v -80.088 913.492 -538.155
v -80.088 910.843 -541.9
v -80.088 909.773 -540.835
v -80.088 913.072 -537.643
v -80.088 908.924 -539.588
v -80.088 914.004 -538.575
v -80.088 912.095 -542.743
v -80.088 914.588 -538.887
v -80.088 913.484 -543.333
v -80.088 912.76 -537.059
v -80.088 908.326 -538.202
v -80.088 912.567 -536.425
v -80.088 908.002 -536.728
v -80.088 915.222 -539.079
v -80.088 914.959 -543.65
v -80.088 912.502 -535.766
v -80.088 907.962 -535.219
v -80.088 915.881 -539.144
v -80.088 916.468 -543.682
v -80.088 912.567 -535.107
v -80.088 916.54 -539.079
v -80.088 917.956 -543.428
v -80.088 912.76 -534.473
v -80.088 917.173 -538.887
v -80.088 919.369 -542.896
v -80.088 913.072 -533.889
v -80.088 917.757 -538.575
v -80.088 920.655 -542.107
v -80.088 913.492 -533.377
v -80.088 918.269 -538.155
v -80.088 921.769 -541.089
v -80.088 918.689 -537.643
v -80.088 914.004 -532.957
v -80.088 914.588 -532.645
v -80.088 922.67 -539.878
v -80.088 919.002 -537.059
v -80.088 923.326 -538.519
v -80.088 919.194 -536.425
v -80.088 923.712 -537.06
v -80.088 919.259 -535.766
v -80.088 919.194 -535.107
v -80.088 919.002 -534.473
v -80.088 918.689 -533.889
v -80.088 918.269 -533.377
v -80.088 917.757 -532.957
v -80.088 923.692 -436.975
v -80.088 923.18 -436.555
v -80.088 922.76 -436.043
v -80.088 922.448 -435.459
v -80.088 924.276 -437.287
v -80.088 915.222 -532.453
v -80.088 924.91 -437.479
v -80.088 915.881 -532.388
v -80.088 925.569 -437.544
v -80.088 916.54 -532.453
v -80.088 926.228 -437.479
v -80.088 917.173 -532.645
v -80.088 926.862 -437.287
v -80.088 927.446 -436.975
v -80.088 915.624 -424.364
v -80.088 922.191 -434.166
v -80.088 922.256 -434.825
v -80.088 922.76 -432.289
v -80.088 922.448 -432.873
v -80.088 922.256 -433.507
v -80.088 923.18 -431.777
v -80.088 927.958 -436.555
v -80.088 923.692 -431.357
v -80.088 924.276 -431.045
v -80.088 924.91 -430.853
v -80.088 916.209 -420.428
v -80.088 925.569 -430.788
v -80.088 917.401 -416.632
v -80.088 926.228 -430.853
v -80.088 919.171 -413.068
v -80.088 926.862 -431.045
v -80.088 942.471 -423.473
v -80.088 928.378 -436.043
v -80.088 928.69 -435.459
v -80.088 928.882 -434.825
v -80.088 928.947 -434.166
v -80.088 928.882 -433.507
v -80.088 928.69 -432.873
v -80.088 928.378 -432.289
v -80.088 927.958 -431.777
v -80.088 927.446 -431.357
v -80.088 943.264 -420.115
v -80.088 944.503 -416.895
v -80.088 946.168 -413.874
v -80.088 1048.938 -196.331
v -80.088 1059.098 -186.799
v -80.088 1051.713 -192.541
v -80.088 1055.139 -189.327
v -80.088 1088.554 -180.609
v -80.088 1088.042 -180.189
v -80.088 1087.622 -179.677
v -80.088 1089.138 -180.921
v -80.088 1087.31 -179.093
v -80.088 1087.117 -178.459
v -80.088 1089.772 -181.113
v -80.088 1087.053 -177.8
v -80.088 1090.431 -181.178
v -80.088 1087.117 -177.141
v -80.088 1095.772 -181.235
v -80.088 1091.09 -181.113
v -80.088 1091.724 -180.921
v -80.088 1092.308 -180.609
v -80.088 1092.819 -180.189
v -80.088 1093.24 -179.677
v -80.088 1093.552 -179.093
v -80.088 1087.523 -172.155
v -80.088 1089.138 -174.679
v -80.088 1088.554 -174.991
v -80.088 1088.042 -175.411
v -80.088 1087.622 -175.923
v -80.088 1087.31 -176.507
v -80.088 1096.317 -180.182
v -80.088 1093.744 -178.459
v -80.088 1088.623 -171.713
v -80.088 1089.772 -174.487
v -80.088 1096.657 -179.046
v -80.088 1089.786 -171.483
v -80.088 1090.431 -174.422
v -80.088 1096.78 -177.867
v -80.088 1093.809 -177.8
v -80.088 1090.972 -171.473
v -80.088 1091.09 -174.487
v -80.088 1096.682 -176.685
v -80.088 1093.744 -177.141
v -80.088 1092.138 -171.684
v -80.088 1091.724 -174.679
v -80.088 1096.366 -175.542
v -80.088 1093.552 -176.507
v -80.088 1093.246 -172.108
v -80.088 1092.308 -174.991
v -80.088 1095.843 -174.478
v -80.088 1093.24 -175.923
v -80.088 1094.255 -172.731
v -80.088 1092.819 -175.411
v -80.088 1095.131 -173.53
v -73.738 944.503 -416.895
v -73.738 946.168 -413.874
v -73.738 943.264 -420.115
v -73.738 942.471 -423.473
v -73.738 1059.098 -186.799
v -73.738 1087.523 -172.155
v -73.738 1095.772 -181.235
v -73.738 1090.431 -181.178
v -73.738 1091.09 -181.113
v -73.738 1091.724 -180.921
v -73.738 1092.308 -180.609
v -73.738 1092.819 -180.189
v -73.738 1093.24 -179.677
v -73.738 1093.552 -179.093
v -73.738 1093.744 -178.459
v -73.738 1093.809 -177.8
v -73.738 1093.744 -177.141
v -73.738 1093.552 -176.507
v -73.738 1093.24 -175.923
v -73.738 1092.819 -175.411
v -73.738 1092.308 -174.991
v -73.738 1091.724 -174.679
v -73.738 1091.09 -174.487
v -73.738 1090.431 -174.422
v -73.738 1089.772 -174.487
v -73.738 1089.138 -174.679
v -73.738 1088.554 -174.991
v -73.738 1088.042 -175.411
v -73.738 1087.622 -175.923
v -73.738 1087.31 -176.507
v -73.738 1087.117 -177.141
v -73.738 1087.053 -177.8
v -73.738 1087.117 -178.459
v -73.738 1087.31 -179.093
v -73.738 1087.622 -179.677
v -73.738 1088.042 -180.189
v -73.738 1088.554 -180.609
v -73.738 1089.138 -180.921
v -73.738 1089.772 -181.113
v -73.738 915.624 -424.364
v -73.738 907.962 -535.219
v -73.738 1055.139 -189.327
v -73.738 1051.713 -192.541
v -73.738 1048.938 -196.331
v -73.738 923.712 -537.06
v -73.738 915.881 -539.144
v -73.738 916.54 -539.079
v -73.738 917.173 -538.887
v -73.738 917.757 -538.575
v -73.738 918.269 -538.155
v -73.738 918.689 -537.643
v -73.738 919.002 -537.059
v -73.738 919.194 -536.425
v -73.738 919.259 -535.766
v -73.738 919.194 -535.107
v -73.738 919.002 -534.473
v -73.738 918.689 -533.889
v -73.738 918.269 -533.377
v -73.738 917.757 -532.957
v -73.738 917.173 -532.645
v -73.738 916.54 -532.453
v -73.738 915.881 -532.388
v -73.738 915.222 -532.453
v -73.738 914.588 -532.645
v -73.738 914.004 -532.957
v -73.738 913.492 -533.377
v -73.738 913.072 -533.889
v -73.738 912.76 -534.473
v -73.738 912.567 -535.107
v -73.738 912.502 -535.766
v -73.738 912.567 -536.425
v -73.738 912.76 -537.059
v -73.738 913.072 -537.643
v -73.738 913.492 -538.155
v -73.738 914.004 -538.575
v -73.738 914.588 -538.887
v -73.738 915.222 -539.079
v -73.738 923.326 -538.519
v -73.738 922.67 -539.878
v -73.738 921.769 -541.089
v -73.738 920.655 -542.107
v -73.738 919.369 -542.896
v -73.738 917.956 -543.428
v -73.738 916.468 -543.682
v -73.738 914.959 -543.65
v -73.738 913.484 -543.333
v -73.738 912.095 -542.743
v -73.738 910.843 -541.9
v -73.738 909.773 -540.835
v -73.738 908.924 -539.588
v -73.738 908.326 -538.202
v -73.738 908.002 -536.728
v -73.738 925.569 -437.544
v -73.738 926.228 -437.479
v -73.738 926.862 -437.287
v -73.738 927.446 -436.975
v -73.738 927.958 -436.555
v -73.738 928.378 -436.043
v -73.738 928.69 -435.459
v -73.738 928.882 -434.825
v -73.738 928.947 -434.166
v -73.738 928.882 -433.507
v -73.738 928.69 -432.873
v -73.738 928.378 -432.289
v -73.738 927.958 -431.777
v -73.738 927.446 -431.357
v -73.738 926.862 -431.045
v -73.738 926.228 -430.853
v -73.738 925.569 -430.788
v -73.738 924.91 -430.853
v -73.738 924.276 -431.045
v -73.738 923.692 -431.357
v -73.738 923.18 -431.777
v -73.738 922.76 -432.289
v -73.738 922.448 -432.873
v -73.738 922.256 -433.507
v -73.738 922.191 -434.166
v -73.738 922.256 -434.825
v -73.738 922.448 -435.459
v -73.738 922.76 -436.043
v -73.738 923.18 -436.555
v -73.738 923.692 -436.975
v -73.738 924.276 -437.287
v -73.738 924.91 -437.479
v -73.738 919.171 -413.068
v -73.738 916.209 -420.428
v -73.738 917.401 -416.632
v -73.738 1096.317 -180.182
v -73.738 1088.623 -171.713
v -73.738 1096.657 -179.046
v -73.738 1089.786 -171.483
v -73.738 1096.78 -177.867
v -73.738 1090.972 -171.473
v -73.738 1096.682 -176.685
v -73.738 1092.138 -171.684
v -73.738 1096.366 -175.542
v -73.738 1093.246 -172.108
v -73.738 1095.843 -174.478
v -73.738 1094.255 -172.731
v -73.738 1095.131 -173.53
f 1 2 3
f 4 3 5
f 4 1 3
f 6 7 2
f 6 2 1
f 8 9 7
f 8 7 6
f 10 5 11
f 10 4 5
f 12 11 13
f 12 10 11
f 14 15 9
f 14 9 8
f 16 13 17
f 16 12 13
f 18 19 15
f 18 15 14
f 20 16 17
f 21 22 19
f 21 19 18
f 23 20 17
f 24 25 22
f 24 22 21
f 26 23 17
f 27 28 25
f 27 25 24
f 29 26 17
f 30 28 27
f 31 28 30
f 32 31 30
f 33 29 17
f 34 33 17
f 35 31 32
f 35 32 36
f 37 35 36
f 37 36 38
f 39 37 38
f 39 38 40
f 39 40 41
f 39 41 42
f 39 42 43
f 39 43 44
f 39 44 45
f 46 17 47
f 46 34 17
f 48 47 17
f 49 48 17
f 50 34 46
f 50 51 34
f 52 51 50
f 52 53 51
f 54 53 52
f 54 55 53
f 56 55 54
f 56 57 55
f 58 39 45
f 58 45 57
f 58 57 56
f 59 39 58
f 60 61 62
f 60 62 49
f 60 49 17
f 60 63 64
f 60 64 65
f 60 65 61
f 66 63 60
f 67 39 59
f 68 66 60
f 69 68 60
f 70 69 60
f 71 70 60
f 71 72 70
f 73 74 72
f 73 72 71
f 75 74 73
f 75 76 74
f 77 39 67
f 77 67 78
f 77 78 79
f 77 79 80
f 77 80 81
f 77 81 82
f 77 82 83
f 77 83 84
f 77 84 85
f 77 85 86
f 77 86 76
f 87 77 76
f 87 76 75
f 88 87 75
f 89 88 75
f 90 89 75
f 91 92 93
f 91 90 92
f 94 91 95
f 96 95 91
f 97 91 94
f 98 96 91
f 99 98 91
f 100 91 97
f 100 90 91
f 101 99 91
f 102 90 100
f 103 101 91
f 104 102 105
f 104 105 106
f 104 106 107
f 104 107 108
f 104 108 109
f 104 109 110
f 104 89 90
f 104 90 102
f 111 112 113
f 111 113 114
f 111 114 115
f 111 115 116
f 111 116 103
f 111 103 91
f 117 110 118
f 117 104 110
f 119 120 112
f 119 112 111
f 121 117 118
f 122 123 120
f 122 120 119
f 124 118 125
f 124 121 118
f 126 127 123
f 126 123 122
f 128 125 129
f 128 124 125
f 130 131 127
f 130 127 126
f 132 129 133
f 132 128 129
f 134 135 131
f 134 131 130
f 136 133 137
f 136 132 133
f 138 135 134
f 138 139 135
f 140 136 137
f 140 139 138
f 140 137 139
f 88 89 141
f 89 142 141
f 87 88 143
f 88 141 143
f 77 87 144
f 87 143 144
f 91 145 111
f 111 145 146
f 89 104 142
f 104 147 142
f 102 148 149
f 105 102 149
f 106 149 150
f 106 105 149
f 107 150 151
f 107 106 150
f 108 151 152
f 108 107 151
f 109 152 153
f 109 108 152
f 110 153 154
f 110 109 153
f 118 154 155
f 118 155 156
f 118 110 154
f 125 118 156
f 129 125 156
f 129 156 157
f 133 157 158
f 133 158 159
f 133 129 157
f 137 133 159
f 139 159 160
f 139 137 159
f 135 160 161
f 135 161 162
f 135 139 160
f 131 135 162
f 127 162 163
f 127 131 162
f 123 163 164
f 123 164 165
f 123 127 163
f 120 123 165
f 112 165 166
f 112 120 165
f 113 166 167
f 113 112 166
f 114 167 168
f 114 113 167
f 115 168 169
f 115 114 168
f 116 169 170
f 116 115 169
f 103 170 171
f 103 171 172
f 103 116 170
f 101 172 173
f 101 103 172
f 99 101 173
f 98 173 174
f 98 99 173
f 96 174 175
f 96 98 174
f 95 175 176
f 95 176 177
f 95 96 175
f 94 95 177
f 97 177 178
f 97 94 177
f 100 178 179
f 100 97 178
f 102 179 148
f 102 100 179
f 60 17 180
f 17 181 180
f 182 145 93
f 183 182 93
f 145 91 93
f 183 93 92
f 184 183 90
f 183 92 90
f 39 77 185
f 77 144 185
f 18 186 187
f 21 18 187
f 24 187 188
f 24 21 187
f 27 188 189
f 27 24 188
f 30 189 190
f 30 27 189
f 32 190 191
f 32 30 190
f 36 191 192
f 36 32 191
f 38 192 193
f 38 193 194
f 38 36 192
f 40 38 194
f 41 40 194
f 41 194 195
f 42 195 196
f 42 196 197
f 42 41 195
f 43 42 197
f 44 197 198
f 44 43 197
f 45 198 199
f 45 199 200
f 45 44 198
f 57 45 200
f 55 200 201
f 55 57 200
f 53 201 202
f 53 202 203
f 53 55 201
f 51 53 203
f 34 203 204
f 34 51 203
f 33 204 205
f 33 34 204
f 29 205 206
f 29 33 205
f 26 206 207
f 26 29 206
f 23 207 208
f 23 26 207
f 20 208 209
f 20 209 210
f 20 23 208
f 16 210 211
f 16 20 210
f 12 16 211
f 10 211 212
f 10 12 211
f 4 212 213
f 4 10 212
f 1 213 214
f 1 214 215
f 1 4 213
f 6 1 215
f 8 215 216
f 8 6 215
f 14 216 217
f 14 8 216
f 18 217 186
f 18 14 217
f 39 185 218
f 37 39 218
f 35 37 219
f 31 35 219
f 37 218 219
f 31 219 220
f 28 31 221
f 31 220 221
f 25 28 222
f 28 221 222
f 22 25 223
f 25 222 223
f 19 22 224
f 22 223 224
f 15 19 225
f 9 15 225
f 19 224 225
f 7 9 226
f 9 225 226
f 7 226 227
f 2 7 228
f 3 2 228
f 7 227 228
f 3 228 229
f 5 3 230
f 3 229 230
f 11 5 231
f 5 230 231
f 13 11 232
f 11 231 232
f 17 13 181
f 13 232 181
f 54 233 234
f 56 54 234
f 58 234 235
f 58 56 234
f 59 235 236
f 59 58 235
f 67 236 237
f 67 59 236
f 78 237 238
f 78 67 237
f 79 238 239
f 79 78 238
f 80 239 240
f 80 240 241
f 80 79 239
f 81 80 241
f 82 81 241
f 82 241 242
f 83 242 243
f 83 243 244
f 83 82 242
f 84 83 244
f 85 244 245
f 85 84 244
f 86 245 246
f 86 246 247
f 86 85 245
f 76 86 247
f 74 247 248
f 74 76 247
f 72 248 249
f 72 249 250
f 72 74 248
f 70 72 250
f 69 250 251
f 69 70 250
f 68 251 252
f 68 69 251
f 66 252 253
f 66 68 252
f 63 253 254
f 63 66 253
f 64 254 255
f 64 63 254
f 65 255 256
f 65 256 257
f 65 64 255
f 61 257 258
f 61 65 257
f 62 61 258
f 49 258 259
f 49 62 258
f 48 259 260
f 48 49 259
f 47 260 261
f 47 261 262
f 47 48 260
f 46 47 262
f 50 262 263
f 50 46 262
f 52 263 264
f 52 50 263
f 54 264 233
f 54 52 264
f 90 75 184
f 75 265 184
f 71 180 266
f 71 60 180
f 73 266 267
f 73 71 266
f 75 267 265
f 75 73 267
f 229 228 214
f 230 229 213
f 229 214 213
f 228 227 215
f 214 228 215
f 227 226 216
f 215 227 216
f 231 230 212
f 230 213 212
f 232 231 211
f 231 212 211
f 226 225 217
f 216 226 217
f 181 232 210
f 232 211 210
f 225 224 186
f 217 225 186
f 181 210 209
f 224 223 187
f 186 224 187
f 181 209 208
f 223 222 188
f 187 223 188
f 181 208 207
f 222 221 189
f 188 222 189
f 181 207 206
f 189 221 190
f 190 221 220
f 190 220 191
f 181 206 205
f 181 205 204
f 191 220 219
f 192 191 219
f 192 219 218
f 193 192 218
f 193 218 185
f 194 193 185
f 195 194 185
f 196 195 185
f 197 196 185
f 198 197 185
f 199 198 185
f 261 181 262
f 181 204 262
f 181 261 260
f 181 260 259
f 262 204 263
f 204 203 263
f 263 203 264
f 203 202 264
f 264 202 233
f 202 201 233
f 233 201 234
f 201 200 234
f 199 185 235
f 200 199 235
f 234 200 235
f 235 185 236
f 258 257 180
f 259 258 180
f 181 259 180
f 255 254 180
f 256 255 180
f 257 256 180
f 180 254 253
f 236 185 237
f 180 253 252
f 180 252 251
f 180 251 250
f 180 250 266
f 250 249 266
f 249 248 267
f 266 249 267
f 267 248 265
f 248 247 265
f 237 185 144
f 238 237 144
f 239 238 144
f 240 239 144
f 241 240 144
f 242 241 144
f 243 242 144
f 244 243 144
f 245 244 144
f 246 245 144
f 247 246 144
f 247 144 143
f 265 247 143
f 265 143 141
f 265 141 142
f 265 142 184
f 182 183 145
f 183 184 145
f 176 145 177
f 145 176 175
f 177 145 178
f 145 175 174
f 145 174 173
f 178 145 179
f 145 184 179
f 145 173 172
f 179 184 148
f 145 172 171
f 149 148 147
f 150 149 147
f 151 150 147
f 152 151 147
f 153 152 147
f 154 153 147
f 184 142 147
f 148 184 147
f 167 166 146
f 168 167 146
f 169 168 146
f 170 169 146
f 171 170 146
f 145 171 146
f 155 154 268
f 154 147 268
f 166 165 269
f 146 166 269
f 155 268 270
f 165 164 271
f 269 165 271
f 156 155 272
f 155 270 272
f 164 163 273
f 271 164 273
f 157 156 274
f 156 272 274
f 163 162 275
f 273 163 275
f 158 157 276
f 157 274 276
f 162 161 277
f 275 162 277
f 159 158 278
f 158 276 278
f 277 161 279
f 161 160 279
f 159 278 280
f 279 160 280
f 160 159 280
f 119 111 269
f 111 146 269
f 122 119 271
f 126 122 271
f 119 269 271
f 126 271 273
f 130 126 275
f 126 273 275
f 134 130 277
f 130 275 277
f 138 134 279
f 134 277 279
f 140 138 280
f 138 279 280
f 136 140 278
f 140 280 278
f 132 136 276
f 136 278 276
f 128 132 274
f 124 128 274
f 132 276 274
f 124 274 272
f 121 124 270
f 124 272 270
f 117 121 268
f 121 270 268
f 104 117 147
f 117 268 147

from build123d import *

# Parameters (mm, degrees)
SKETCH1_R           = 3.3782
BOSS_EXTRUDE1_DEPTH = 3.175
FILLET1_R           = 25.4


with BuildPart() as part:
    # Sketch1 → Boss-Extrude1 (new, symmetric)
    with BuildSketch(Plane(origin=(-76.913317281, 0, 0), x_dir=(0, 0, -1), z_dir=(1, 0, 0))):
        with BuildLine():
            Line((535.218804975, 907.961983625), (418.2911251, 916.04381761))
            Line((418.2911251, 916.04381761), (190.115926381, 1052.658490892))
            Line((190.115926381, 1052.658490892), (172.155048622, 1087.522632949))
            ThreePointArc((172.155048622, 1087.522632949), (173.529973777, 1095.130662847), (181.234623159, 1095.771690164))
            Line((181.234623159, 1095.771690164), (418.2911251, 943.327259155))
            Line((418.2911251, 943.327259155), (537.059525989, 923.712003677))
            ThreePointArc((537.059525989, 923.712003677), (543.649965664, 914.959198723), (535.218804975, 907.961983625))
        make_face()
        with Locations((177.8, 1090.430729224)):
            Circle(SKETCH1_R, mode=Mode.SUBTRACT)
        with Locations((434.1661251, 925.56881761)):
            Circle(SKETCH1_R, mode=Mode.SUBTRACT)
        with Locations((535.7661251, 915.880591264)):
            Circle(SKETCH1_R, mode=Mode.SUBTRACT)
    extrude(amount=BOSS_EXTRUDE1_DEPTH, both=True)

    # Fillet1
    fillet1_edges = [part.edges().sort_by_distance(p)[0] for p in [
        (-76.913317281, 916.04381761, -418.2911251),
        (-76.913317281, 1052.658490892, -190.115926381),
        (-76.913317281, 943.327259155, -418.2911251),
    ]]
    fillet(fillet1_edges, radius=FILLET1_R)


solid = part.part
